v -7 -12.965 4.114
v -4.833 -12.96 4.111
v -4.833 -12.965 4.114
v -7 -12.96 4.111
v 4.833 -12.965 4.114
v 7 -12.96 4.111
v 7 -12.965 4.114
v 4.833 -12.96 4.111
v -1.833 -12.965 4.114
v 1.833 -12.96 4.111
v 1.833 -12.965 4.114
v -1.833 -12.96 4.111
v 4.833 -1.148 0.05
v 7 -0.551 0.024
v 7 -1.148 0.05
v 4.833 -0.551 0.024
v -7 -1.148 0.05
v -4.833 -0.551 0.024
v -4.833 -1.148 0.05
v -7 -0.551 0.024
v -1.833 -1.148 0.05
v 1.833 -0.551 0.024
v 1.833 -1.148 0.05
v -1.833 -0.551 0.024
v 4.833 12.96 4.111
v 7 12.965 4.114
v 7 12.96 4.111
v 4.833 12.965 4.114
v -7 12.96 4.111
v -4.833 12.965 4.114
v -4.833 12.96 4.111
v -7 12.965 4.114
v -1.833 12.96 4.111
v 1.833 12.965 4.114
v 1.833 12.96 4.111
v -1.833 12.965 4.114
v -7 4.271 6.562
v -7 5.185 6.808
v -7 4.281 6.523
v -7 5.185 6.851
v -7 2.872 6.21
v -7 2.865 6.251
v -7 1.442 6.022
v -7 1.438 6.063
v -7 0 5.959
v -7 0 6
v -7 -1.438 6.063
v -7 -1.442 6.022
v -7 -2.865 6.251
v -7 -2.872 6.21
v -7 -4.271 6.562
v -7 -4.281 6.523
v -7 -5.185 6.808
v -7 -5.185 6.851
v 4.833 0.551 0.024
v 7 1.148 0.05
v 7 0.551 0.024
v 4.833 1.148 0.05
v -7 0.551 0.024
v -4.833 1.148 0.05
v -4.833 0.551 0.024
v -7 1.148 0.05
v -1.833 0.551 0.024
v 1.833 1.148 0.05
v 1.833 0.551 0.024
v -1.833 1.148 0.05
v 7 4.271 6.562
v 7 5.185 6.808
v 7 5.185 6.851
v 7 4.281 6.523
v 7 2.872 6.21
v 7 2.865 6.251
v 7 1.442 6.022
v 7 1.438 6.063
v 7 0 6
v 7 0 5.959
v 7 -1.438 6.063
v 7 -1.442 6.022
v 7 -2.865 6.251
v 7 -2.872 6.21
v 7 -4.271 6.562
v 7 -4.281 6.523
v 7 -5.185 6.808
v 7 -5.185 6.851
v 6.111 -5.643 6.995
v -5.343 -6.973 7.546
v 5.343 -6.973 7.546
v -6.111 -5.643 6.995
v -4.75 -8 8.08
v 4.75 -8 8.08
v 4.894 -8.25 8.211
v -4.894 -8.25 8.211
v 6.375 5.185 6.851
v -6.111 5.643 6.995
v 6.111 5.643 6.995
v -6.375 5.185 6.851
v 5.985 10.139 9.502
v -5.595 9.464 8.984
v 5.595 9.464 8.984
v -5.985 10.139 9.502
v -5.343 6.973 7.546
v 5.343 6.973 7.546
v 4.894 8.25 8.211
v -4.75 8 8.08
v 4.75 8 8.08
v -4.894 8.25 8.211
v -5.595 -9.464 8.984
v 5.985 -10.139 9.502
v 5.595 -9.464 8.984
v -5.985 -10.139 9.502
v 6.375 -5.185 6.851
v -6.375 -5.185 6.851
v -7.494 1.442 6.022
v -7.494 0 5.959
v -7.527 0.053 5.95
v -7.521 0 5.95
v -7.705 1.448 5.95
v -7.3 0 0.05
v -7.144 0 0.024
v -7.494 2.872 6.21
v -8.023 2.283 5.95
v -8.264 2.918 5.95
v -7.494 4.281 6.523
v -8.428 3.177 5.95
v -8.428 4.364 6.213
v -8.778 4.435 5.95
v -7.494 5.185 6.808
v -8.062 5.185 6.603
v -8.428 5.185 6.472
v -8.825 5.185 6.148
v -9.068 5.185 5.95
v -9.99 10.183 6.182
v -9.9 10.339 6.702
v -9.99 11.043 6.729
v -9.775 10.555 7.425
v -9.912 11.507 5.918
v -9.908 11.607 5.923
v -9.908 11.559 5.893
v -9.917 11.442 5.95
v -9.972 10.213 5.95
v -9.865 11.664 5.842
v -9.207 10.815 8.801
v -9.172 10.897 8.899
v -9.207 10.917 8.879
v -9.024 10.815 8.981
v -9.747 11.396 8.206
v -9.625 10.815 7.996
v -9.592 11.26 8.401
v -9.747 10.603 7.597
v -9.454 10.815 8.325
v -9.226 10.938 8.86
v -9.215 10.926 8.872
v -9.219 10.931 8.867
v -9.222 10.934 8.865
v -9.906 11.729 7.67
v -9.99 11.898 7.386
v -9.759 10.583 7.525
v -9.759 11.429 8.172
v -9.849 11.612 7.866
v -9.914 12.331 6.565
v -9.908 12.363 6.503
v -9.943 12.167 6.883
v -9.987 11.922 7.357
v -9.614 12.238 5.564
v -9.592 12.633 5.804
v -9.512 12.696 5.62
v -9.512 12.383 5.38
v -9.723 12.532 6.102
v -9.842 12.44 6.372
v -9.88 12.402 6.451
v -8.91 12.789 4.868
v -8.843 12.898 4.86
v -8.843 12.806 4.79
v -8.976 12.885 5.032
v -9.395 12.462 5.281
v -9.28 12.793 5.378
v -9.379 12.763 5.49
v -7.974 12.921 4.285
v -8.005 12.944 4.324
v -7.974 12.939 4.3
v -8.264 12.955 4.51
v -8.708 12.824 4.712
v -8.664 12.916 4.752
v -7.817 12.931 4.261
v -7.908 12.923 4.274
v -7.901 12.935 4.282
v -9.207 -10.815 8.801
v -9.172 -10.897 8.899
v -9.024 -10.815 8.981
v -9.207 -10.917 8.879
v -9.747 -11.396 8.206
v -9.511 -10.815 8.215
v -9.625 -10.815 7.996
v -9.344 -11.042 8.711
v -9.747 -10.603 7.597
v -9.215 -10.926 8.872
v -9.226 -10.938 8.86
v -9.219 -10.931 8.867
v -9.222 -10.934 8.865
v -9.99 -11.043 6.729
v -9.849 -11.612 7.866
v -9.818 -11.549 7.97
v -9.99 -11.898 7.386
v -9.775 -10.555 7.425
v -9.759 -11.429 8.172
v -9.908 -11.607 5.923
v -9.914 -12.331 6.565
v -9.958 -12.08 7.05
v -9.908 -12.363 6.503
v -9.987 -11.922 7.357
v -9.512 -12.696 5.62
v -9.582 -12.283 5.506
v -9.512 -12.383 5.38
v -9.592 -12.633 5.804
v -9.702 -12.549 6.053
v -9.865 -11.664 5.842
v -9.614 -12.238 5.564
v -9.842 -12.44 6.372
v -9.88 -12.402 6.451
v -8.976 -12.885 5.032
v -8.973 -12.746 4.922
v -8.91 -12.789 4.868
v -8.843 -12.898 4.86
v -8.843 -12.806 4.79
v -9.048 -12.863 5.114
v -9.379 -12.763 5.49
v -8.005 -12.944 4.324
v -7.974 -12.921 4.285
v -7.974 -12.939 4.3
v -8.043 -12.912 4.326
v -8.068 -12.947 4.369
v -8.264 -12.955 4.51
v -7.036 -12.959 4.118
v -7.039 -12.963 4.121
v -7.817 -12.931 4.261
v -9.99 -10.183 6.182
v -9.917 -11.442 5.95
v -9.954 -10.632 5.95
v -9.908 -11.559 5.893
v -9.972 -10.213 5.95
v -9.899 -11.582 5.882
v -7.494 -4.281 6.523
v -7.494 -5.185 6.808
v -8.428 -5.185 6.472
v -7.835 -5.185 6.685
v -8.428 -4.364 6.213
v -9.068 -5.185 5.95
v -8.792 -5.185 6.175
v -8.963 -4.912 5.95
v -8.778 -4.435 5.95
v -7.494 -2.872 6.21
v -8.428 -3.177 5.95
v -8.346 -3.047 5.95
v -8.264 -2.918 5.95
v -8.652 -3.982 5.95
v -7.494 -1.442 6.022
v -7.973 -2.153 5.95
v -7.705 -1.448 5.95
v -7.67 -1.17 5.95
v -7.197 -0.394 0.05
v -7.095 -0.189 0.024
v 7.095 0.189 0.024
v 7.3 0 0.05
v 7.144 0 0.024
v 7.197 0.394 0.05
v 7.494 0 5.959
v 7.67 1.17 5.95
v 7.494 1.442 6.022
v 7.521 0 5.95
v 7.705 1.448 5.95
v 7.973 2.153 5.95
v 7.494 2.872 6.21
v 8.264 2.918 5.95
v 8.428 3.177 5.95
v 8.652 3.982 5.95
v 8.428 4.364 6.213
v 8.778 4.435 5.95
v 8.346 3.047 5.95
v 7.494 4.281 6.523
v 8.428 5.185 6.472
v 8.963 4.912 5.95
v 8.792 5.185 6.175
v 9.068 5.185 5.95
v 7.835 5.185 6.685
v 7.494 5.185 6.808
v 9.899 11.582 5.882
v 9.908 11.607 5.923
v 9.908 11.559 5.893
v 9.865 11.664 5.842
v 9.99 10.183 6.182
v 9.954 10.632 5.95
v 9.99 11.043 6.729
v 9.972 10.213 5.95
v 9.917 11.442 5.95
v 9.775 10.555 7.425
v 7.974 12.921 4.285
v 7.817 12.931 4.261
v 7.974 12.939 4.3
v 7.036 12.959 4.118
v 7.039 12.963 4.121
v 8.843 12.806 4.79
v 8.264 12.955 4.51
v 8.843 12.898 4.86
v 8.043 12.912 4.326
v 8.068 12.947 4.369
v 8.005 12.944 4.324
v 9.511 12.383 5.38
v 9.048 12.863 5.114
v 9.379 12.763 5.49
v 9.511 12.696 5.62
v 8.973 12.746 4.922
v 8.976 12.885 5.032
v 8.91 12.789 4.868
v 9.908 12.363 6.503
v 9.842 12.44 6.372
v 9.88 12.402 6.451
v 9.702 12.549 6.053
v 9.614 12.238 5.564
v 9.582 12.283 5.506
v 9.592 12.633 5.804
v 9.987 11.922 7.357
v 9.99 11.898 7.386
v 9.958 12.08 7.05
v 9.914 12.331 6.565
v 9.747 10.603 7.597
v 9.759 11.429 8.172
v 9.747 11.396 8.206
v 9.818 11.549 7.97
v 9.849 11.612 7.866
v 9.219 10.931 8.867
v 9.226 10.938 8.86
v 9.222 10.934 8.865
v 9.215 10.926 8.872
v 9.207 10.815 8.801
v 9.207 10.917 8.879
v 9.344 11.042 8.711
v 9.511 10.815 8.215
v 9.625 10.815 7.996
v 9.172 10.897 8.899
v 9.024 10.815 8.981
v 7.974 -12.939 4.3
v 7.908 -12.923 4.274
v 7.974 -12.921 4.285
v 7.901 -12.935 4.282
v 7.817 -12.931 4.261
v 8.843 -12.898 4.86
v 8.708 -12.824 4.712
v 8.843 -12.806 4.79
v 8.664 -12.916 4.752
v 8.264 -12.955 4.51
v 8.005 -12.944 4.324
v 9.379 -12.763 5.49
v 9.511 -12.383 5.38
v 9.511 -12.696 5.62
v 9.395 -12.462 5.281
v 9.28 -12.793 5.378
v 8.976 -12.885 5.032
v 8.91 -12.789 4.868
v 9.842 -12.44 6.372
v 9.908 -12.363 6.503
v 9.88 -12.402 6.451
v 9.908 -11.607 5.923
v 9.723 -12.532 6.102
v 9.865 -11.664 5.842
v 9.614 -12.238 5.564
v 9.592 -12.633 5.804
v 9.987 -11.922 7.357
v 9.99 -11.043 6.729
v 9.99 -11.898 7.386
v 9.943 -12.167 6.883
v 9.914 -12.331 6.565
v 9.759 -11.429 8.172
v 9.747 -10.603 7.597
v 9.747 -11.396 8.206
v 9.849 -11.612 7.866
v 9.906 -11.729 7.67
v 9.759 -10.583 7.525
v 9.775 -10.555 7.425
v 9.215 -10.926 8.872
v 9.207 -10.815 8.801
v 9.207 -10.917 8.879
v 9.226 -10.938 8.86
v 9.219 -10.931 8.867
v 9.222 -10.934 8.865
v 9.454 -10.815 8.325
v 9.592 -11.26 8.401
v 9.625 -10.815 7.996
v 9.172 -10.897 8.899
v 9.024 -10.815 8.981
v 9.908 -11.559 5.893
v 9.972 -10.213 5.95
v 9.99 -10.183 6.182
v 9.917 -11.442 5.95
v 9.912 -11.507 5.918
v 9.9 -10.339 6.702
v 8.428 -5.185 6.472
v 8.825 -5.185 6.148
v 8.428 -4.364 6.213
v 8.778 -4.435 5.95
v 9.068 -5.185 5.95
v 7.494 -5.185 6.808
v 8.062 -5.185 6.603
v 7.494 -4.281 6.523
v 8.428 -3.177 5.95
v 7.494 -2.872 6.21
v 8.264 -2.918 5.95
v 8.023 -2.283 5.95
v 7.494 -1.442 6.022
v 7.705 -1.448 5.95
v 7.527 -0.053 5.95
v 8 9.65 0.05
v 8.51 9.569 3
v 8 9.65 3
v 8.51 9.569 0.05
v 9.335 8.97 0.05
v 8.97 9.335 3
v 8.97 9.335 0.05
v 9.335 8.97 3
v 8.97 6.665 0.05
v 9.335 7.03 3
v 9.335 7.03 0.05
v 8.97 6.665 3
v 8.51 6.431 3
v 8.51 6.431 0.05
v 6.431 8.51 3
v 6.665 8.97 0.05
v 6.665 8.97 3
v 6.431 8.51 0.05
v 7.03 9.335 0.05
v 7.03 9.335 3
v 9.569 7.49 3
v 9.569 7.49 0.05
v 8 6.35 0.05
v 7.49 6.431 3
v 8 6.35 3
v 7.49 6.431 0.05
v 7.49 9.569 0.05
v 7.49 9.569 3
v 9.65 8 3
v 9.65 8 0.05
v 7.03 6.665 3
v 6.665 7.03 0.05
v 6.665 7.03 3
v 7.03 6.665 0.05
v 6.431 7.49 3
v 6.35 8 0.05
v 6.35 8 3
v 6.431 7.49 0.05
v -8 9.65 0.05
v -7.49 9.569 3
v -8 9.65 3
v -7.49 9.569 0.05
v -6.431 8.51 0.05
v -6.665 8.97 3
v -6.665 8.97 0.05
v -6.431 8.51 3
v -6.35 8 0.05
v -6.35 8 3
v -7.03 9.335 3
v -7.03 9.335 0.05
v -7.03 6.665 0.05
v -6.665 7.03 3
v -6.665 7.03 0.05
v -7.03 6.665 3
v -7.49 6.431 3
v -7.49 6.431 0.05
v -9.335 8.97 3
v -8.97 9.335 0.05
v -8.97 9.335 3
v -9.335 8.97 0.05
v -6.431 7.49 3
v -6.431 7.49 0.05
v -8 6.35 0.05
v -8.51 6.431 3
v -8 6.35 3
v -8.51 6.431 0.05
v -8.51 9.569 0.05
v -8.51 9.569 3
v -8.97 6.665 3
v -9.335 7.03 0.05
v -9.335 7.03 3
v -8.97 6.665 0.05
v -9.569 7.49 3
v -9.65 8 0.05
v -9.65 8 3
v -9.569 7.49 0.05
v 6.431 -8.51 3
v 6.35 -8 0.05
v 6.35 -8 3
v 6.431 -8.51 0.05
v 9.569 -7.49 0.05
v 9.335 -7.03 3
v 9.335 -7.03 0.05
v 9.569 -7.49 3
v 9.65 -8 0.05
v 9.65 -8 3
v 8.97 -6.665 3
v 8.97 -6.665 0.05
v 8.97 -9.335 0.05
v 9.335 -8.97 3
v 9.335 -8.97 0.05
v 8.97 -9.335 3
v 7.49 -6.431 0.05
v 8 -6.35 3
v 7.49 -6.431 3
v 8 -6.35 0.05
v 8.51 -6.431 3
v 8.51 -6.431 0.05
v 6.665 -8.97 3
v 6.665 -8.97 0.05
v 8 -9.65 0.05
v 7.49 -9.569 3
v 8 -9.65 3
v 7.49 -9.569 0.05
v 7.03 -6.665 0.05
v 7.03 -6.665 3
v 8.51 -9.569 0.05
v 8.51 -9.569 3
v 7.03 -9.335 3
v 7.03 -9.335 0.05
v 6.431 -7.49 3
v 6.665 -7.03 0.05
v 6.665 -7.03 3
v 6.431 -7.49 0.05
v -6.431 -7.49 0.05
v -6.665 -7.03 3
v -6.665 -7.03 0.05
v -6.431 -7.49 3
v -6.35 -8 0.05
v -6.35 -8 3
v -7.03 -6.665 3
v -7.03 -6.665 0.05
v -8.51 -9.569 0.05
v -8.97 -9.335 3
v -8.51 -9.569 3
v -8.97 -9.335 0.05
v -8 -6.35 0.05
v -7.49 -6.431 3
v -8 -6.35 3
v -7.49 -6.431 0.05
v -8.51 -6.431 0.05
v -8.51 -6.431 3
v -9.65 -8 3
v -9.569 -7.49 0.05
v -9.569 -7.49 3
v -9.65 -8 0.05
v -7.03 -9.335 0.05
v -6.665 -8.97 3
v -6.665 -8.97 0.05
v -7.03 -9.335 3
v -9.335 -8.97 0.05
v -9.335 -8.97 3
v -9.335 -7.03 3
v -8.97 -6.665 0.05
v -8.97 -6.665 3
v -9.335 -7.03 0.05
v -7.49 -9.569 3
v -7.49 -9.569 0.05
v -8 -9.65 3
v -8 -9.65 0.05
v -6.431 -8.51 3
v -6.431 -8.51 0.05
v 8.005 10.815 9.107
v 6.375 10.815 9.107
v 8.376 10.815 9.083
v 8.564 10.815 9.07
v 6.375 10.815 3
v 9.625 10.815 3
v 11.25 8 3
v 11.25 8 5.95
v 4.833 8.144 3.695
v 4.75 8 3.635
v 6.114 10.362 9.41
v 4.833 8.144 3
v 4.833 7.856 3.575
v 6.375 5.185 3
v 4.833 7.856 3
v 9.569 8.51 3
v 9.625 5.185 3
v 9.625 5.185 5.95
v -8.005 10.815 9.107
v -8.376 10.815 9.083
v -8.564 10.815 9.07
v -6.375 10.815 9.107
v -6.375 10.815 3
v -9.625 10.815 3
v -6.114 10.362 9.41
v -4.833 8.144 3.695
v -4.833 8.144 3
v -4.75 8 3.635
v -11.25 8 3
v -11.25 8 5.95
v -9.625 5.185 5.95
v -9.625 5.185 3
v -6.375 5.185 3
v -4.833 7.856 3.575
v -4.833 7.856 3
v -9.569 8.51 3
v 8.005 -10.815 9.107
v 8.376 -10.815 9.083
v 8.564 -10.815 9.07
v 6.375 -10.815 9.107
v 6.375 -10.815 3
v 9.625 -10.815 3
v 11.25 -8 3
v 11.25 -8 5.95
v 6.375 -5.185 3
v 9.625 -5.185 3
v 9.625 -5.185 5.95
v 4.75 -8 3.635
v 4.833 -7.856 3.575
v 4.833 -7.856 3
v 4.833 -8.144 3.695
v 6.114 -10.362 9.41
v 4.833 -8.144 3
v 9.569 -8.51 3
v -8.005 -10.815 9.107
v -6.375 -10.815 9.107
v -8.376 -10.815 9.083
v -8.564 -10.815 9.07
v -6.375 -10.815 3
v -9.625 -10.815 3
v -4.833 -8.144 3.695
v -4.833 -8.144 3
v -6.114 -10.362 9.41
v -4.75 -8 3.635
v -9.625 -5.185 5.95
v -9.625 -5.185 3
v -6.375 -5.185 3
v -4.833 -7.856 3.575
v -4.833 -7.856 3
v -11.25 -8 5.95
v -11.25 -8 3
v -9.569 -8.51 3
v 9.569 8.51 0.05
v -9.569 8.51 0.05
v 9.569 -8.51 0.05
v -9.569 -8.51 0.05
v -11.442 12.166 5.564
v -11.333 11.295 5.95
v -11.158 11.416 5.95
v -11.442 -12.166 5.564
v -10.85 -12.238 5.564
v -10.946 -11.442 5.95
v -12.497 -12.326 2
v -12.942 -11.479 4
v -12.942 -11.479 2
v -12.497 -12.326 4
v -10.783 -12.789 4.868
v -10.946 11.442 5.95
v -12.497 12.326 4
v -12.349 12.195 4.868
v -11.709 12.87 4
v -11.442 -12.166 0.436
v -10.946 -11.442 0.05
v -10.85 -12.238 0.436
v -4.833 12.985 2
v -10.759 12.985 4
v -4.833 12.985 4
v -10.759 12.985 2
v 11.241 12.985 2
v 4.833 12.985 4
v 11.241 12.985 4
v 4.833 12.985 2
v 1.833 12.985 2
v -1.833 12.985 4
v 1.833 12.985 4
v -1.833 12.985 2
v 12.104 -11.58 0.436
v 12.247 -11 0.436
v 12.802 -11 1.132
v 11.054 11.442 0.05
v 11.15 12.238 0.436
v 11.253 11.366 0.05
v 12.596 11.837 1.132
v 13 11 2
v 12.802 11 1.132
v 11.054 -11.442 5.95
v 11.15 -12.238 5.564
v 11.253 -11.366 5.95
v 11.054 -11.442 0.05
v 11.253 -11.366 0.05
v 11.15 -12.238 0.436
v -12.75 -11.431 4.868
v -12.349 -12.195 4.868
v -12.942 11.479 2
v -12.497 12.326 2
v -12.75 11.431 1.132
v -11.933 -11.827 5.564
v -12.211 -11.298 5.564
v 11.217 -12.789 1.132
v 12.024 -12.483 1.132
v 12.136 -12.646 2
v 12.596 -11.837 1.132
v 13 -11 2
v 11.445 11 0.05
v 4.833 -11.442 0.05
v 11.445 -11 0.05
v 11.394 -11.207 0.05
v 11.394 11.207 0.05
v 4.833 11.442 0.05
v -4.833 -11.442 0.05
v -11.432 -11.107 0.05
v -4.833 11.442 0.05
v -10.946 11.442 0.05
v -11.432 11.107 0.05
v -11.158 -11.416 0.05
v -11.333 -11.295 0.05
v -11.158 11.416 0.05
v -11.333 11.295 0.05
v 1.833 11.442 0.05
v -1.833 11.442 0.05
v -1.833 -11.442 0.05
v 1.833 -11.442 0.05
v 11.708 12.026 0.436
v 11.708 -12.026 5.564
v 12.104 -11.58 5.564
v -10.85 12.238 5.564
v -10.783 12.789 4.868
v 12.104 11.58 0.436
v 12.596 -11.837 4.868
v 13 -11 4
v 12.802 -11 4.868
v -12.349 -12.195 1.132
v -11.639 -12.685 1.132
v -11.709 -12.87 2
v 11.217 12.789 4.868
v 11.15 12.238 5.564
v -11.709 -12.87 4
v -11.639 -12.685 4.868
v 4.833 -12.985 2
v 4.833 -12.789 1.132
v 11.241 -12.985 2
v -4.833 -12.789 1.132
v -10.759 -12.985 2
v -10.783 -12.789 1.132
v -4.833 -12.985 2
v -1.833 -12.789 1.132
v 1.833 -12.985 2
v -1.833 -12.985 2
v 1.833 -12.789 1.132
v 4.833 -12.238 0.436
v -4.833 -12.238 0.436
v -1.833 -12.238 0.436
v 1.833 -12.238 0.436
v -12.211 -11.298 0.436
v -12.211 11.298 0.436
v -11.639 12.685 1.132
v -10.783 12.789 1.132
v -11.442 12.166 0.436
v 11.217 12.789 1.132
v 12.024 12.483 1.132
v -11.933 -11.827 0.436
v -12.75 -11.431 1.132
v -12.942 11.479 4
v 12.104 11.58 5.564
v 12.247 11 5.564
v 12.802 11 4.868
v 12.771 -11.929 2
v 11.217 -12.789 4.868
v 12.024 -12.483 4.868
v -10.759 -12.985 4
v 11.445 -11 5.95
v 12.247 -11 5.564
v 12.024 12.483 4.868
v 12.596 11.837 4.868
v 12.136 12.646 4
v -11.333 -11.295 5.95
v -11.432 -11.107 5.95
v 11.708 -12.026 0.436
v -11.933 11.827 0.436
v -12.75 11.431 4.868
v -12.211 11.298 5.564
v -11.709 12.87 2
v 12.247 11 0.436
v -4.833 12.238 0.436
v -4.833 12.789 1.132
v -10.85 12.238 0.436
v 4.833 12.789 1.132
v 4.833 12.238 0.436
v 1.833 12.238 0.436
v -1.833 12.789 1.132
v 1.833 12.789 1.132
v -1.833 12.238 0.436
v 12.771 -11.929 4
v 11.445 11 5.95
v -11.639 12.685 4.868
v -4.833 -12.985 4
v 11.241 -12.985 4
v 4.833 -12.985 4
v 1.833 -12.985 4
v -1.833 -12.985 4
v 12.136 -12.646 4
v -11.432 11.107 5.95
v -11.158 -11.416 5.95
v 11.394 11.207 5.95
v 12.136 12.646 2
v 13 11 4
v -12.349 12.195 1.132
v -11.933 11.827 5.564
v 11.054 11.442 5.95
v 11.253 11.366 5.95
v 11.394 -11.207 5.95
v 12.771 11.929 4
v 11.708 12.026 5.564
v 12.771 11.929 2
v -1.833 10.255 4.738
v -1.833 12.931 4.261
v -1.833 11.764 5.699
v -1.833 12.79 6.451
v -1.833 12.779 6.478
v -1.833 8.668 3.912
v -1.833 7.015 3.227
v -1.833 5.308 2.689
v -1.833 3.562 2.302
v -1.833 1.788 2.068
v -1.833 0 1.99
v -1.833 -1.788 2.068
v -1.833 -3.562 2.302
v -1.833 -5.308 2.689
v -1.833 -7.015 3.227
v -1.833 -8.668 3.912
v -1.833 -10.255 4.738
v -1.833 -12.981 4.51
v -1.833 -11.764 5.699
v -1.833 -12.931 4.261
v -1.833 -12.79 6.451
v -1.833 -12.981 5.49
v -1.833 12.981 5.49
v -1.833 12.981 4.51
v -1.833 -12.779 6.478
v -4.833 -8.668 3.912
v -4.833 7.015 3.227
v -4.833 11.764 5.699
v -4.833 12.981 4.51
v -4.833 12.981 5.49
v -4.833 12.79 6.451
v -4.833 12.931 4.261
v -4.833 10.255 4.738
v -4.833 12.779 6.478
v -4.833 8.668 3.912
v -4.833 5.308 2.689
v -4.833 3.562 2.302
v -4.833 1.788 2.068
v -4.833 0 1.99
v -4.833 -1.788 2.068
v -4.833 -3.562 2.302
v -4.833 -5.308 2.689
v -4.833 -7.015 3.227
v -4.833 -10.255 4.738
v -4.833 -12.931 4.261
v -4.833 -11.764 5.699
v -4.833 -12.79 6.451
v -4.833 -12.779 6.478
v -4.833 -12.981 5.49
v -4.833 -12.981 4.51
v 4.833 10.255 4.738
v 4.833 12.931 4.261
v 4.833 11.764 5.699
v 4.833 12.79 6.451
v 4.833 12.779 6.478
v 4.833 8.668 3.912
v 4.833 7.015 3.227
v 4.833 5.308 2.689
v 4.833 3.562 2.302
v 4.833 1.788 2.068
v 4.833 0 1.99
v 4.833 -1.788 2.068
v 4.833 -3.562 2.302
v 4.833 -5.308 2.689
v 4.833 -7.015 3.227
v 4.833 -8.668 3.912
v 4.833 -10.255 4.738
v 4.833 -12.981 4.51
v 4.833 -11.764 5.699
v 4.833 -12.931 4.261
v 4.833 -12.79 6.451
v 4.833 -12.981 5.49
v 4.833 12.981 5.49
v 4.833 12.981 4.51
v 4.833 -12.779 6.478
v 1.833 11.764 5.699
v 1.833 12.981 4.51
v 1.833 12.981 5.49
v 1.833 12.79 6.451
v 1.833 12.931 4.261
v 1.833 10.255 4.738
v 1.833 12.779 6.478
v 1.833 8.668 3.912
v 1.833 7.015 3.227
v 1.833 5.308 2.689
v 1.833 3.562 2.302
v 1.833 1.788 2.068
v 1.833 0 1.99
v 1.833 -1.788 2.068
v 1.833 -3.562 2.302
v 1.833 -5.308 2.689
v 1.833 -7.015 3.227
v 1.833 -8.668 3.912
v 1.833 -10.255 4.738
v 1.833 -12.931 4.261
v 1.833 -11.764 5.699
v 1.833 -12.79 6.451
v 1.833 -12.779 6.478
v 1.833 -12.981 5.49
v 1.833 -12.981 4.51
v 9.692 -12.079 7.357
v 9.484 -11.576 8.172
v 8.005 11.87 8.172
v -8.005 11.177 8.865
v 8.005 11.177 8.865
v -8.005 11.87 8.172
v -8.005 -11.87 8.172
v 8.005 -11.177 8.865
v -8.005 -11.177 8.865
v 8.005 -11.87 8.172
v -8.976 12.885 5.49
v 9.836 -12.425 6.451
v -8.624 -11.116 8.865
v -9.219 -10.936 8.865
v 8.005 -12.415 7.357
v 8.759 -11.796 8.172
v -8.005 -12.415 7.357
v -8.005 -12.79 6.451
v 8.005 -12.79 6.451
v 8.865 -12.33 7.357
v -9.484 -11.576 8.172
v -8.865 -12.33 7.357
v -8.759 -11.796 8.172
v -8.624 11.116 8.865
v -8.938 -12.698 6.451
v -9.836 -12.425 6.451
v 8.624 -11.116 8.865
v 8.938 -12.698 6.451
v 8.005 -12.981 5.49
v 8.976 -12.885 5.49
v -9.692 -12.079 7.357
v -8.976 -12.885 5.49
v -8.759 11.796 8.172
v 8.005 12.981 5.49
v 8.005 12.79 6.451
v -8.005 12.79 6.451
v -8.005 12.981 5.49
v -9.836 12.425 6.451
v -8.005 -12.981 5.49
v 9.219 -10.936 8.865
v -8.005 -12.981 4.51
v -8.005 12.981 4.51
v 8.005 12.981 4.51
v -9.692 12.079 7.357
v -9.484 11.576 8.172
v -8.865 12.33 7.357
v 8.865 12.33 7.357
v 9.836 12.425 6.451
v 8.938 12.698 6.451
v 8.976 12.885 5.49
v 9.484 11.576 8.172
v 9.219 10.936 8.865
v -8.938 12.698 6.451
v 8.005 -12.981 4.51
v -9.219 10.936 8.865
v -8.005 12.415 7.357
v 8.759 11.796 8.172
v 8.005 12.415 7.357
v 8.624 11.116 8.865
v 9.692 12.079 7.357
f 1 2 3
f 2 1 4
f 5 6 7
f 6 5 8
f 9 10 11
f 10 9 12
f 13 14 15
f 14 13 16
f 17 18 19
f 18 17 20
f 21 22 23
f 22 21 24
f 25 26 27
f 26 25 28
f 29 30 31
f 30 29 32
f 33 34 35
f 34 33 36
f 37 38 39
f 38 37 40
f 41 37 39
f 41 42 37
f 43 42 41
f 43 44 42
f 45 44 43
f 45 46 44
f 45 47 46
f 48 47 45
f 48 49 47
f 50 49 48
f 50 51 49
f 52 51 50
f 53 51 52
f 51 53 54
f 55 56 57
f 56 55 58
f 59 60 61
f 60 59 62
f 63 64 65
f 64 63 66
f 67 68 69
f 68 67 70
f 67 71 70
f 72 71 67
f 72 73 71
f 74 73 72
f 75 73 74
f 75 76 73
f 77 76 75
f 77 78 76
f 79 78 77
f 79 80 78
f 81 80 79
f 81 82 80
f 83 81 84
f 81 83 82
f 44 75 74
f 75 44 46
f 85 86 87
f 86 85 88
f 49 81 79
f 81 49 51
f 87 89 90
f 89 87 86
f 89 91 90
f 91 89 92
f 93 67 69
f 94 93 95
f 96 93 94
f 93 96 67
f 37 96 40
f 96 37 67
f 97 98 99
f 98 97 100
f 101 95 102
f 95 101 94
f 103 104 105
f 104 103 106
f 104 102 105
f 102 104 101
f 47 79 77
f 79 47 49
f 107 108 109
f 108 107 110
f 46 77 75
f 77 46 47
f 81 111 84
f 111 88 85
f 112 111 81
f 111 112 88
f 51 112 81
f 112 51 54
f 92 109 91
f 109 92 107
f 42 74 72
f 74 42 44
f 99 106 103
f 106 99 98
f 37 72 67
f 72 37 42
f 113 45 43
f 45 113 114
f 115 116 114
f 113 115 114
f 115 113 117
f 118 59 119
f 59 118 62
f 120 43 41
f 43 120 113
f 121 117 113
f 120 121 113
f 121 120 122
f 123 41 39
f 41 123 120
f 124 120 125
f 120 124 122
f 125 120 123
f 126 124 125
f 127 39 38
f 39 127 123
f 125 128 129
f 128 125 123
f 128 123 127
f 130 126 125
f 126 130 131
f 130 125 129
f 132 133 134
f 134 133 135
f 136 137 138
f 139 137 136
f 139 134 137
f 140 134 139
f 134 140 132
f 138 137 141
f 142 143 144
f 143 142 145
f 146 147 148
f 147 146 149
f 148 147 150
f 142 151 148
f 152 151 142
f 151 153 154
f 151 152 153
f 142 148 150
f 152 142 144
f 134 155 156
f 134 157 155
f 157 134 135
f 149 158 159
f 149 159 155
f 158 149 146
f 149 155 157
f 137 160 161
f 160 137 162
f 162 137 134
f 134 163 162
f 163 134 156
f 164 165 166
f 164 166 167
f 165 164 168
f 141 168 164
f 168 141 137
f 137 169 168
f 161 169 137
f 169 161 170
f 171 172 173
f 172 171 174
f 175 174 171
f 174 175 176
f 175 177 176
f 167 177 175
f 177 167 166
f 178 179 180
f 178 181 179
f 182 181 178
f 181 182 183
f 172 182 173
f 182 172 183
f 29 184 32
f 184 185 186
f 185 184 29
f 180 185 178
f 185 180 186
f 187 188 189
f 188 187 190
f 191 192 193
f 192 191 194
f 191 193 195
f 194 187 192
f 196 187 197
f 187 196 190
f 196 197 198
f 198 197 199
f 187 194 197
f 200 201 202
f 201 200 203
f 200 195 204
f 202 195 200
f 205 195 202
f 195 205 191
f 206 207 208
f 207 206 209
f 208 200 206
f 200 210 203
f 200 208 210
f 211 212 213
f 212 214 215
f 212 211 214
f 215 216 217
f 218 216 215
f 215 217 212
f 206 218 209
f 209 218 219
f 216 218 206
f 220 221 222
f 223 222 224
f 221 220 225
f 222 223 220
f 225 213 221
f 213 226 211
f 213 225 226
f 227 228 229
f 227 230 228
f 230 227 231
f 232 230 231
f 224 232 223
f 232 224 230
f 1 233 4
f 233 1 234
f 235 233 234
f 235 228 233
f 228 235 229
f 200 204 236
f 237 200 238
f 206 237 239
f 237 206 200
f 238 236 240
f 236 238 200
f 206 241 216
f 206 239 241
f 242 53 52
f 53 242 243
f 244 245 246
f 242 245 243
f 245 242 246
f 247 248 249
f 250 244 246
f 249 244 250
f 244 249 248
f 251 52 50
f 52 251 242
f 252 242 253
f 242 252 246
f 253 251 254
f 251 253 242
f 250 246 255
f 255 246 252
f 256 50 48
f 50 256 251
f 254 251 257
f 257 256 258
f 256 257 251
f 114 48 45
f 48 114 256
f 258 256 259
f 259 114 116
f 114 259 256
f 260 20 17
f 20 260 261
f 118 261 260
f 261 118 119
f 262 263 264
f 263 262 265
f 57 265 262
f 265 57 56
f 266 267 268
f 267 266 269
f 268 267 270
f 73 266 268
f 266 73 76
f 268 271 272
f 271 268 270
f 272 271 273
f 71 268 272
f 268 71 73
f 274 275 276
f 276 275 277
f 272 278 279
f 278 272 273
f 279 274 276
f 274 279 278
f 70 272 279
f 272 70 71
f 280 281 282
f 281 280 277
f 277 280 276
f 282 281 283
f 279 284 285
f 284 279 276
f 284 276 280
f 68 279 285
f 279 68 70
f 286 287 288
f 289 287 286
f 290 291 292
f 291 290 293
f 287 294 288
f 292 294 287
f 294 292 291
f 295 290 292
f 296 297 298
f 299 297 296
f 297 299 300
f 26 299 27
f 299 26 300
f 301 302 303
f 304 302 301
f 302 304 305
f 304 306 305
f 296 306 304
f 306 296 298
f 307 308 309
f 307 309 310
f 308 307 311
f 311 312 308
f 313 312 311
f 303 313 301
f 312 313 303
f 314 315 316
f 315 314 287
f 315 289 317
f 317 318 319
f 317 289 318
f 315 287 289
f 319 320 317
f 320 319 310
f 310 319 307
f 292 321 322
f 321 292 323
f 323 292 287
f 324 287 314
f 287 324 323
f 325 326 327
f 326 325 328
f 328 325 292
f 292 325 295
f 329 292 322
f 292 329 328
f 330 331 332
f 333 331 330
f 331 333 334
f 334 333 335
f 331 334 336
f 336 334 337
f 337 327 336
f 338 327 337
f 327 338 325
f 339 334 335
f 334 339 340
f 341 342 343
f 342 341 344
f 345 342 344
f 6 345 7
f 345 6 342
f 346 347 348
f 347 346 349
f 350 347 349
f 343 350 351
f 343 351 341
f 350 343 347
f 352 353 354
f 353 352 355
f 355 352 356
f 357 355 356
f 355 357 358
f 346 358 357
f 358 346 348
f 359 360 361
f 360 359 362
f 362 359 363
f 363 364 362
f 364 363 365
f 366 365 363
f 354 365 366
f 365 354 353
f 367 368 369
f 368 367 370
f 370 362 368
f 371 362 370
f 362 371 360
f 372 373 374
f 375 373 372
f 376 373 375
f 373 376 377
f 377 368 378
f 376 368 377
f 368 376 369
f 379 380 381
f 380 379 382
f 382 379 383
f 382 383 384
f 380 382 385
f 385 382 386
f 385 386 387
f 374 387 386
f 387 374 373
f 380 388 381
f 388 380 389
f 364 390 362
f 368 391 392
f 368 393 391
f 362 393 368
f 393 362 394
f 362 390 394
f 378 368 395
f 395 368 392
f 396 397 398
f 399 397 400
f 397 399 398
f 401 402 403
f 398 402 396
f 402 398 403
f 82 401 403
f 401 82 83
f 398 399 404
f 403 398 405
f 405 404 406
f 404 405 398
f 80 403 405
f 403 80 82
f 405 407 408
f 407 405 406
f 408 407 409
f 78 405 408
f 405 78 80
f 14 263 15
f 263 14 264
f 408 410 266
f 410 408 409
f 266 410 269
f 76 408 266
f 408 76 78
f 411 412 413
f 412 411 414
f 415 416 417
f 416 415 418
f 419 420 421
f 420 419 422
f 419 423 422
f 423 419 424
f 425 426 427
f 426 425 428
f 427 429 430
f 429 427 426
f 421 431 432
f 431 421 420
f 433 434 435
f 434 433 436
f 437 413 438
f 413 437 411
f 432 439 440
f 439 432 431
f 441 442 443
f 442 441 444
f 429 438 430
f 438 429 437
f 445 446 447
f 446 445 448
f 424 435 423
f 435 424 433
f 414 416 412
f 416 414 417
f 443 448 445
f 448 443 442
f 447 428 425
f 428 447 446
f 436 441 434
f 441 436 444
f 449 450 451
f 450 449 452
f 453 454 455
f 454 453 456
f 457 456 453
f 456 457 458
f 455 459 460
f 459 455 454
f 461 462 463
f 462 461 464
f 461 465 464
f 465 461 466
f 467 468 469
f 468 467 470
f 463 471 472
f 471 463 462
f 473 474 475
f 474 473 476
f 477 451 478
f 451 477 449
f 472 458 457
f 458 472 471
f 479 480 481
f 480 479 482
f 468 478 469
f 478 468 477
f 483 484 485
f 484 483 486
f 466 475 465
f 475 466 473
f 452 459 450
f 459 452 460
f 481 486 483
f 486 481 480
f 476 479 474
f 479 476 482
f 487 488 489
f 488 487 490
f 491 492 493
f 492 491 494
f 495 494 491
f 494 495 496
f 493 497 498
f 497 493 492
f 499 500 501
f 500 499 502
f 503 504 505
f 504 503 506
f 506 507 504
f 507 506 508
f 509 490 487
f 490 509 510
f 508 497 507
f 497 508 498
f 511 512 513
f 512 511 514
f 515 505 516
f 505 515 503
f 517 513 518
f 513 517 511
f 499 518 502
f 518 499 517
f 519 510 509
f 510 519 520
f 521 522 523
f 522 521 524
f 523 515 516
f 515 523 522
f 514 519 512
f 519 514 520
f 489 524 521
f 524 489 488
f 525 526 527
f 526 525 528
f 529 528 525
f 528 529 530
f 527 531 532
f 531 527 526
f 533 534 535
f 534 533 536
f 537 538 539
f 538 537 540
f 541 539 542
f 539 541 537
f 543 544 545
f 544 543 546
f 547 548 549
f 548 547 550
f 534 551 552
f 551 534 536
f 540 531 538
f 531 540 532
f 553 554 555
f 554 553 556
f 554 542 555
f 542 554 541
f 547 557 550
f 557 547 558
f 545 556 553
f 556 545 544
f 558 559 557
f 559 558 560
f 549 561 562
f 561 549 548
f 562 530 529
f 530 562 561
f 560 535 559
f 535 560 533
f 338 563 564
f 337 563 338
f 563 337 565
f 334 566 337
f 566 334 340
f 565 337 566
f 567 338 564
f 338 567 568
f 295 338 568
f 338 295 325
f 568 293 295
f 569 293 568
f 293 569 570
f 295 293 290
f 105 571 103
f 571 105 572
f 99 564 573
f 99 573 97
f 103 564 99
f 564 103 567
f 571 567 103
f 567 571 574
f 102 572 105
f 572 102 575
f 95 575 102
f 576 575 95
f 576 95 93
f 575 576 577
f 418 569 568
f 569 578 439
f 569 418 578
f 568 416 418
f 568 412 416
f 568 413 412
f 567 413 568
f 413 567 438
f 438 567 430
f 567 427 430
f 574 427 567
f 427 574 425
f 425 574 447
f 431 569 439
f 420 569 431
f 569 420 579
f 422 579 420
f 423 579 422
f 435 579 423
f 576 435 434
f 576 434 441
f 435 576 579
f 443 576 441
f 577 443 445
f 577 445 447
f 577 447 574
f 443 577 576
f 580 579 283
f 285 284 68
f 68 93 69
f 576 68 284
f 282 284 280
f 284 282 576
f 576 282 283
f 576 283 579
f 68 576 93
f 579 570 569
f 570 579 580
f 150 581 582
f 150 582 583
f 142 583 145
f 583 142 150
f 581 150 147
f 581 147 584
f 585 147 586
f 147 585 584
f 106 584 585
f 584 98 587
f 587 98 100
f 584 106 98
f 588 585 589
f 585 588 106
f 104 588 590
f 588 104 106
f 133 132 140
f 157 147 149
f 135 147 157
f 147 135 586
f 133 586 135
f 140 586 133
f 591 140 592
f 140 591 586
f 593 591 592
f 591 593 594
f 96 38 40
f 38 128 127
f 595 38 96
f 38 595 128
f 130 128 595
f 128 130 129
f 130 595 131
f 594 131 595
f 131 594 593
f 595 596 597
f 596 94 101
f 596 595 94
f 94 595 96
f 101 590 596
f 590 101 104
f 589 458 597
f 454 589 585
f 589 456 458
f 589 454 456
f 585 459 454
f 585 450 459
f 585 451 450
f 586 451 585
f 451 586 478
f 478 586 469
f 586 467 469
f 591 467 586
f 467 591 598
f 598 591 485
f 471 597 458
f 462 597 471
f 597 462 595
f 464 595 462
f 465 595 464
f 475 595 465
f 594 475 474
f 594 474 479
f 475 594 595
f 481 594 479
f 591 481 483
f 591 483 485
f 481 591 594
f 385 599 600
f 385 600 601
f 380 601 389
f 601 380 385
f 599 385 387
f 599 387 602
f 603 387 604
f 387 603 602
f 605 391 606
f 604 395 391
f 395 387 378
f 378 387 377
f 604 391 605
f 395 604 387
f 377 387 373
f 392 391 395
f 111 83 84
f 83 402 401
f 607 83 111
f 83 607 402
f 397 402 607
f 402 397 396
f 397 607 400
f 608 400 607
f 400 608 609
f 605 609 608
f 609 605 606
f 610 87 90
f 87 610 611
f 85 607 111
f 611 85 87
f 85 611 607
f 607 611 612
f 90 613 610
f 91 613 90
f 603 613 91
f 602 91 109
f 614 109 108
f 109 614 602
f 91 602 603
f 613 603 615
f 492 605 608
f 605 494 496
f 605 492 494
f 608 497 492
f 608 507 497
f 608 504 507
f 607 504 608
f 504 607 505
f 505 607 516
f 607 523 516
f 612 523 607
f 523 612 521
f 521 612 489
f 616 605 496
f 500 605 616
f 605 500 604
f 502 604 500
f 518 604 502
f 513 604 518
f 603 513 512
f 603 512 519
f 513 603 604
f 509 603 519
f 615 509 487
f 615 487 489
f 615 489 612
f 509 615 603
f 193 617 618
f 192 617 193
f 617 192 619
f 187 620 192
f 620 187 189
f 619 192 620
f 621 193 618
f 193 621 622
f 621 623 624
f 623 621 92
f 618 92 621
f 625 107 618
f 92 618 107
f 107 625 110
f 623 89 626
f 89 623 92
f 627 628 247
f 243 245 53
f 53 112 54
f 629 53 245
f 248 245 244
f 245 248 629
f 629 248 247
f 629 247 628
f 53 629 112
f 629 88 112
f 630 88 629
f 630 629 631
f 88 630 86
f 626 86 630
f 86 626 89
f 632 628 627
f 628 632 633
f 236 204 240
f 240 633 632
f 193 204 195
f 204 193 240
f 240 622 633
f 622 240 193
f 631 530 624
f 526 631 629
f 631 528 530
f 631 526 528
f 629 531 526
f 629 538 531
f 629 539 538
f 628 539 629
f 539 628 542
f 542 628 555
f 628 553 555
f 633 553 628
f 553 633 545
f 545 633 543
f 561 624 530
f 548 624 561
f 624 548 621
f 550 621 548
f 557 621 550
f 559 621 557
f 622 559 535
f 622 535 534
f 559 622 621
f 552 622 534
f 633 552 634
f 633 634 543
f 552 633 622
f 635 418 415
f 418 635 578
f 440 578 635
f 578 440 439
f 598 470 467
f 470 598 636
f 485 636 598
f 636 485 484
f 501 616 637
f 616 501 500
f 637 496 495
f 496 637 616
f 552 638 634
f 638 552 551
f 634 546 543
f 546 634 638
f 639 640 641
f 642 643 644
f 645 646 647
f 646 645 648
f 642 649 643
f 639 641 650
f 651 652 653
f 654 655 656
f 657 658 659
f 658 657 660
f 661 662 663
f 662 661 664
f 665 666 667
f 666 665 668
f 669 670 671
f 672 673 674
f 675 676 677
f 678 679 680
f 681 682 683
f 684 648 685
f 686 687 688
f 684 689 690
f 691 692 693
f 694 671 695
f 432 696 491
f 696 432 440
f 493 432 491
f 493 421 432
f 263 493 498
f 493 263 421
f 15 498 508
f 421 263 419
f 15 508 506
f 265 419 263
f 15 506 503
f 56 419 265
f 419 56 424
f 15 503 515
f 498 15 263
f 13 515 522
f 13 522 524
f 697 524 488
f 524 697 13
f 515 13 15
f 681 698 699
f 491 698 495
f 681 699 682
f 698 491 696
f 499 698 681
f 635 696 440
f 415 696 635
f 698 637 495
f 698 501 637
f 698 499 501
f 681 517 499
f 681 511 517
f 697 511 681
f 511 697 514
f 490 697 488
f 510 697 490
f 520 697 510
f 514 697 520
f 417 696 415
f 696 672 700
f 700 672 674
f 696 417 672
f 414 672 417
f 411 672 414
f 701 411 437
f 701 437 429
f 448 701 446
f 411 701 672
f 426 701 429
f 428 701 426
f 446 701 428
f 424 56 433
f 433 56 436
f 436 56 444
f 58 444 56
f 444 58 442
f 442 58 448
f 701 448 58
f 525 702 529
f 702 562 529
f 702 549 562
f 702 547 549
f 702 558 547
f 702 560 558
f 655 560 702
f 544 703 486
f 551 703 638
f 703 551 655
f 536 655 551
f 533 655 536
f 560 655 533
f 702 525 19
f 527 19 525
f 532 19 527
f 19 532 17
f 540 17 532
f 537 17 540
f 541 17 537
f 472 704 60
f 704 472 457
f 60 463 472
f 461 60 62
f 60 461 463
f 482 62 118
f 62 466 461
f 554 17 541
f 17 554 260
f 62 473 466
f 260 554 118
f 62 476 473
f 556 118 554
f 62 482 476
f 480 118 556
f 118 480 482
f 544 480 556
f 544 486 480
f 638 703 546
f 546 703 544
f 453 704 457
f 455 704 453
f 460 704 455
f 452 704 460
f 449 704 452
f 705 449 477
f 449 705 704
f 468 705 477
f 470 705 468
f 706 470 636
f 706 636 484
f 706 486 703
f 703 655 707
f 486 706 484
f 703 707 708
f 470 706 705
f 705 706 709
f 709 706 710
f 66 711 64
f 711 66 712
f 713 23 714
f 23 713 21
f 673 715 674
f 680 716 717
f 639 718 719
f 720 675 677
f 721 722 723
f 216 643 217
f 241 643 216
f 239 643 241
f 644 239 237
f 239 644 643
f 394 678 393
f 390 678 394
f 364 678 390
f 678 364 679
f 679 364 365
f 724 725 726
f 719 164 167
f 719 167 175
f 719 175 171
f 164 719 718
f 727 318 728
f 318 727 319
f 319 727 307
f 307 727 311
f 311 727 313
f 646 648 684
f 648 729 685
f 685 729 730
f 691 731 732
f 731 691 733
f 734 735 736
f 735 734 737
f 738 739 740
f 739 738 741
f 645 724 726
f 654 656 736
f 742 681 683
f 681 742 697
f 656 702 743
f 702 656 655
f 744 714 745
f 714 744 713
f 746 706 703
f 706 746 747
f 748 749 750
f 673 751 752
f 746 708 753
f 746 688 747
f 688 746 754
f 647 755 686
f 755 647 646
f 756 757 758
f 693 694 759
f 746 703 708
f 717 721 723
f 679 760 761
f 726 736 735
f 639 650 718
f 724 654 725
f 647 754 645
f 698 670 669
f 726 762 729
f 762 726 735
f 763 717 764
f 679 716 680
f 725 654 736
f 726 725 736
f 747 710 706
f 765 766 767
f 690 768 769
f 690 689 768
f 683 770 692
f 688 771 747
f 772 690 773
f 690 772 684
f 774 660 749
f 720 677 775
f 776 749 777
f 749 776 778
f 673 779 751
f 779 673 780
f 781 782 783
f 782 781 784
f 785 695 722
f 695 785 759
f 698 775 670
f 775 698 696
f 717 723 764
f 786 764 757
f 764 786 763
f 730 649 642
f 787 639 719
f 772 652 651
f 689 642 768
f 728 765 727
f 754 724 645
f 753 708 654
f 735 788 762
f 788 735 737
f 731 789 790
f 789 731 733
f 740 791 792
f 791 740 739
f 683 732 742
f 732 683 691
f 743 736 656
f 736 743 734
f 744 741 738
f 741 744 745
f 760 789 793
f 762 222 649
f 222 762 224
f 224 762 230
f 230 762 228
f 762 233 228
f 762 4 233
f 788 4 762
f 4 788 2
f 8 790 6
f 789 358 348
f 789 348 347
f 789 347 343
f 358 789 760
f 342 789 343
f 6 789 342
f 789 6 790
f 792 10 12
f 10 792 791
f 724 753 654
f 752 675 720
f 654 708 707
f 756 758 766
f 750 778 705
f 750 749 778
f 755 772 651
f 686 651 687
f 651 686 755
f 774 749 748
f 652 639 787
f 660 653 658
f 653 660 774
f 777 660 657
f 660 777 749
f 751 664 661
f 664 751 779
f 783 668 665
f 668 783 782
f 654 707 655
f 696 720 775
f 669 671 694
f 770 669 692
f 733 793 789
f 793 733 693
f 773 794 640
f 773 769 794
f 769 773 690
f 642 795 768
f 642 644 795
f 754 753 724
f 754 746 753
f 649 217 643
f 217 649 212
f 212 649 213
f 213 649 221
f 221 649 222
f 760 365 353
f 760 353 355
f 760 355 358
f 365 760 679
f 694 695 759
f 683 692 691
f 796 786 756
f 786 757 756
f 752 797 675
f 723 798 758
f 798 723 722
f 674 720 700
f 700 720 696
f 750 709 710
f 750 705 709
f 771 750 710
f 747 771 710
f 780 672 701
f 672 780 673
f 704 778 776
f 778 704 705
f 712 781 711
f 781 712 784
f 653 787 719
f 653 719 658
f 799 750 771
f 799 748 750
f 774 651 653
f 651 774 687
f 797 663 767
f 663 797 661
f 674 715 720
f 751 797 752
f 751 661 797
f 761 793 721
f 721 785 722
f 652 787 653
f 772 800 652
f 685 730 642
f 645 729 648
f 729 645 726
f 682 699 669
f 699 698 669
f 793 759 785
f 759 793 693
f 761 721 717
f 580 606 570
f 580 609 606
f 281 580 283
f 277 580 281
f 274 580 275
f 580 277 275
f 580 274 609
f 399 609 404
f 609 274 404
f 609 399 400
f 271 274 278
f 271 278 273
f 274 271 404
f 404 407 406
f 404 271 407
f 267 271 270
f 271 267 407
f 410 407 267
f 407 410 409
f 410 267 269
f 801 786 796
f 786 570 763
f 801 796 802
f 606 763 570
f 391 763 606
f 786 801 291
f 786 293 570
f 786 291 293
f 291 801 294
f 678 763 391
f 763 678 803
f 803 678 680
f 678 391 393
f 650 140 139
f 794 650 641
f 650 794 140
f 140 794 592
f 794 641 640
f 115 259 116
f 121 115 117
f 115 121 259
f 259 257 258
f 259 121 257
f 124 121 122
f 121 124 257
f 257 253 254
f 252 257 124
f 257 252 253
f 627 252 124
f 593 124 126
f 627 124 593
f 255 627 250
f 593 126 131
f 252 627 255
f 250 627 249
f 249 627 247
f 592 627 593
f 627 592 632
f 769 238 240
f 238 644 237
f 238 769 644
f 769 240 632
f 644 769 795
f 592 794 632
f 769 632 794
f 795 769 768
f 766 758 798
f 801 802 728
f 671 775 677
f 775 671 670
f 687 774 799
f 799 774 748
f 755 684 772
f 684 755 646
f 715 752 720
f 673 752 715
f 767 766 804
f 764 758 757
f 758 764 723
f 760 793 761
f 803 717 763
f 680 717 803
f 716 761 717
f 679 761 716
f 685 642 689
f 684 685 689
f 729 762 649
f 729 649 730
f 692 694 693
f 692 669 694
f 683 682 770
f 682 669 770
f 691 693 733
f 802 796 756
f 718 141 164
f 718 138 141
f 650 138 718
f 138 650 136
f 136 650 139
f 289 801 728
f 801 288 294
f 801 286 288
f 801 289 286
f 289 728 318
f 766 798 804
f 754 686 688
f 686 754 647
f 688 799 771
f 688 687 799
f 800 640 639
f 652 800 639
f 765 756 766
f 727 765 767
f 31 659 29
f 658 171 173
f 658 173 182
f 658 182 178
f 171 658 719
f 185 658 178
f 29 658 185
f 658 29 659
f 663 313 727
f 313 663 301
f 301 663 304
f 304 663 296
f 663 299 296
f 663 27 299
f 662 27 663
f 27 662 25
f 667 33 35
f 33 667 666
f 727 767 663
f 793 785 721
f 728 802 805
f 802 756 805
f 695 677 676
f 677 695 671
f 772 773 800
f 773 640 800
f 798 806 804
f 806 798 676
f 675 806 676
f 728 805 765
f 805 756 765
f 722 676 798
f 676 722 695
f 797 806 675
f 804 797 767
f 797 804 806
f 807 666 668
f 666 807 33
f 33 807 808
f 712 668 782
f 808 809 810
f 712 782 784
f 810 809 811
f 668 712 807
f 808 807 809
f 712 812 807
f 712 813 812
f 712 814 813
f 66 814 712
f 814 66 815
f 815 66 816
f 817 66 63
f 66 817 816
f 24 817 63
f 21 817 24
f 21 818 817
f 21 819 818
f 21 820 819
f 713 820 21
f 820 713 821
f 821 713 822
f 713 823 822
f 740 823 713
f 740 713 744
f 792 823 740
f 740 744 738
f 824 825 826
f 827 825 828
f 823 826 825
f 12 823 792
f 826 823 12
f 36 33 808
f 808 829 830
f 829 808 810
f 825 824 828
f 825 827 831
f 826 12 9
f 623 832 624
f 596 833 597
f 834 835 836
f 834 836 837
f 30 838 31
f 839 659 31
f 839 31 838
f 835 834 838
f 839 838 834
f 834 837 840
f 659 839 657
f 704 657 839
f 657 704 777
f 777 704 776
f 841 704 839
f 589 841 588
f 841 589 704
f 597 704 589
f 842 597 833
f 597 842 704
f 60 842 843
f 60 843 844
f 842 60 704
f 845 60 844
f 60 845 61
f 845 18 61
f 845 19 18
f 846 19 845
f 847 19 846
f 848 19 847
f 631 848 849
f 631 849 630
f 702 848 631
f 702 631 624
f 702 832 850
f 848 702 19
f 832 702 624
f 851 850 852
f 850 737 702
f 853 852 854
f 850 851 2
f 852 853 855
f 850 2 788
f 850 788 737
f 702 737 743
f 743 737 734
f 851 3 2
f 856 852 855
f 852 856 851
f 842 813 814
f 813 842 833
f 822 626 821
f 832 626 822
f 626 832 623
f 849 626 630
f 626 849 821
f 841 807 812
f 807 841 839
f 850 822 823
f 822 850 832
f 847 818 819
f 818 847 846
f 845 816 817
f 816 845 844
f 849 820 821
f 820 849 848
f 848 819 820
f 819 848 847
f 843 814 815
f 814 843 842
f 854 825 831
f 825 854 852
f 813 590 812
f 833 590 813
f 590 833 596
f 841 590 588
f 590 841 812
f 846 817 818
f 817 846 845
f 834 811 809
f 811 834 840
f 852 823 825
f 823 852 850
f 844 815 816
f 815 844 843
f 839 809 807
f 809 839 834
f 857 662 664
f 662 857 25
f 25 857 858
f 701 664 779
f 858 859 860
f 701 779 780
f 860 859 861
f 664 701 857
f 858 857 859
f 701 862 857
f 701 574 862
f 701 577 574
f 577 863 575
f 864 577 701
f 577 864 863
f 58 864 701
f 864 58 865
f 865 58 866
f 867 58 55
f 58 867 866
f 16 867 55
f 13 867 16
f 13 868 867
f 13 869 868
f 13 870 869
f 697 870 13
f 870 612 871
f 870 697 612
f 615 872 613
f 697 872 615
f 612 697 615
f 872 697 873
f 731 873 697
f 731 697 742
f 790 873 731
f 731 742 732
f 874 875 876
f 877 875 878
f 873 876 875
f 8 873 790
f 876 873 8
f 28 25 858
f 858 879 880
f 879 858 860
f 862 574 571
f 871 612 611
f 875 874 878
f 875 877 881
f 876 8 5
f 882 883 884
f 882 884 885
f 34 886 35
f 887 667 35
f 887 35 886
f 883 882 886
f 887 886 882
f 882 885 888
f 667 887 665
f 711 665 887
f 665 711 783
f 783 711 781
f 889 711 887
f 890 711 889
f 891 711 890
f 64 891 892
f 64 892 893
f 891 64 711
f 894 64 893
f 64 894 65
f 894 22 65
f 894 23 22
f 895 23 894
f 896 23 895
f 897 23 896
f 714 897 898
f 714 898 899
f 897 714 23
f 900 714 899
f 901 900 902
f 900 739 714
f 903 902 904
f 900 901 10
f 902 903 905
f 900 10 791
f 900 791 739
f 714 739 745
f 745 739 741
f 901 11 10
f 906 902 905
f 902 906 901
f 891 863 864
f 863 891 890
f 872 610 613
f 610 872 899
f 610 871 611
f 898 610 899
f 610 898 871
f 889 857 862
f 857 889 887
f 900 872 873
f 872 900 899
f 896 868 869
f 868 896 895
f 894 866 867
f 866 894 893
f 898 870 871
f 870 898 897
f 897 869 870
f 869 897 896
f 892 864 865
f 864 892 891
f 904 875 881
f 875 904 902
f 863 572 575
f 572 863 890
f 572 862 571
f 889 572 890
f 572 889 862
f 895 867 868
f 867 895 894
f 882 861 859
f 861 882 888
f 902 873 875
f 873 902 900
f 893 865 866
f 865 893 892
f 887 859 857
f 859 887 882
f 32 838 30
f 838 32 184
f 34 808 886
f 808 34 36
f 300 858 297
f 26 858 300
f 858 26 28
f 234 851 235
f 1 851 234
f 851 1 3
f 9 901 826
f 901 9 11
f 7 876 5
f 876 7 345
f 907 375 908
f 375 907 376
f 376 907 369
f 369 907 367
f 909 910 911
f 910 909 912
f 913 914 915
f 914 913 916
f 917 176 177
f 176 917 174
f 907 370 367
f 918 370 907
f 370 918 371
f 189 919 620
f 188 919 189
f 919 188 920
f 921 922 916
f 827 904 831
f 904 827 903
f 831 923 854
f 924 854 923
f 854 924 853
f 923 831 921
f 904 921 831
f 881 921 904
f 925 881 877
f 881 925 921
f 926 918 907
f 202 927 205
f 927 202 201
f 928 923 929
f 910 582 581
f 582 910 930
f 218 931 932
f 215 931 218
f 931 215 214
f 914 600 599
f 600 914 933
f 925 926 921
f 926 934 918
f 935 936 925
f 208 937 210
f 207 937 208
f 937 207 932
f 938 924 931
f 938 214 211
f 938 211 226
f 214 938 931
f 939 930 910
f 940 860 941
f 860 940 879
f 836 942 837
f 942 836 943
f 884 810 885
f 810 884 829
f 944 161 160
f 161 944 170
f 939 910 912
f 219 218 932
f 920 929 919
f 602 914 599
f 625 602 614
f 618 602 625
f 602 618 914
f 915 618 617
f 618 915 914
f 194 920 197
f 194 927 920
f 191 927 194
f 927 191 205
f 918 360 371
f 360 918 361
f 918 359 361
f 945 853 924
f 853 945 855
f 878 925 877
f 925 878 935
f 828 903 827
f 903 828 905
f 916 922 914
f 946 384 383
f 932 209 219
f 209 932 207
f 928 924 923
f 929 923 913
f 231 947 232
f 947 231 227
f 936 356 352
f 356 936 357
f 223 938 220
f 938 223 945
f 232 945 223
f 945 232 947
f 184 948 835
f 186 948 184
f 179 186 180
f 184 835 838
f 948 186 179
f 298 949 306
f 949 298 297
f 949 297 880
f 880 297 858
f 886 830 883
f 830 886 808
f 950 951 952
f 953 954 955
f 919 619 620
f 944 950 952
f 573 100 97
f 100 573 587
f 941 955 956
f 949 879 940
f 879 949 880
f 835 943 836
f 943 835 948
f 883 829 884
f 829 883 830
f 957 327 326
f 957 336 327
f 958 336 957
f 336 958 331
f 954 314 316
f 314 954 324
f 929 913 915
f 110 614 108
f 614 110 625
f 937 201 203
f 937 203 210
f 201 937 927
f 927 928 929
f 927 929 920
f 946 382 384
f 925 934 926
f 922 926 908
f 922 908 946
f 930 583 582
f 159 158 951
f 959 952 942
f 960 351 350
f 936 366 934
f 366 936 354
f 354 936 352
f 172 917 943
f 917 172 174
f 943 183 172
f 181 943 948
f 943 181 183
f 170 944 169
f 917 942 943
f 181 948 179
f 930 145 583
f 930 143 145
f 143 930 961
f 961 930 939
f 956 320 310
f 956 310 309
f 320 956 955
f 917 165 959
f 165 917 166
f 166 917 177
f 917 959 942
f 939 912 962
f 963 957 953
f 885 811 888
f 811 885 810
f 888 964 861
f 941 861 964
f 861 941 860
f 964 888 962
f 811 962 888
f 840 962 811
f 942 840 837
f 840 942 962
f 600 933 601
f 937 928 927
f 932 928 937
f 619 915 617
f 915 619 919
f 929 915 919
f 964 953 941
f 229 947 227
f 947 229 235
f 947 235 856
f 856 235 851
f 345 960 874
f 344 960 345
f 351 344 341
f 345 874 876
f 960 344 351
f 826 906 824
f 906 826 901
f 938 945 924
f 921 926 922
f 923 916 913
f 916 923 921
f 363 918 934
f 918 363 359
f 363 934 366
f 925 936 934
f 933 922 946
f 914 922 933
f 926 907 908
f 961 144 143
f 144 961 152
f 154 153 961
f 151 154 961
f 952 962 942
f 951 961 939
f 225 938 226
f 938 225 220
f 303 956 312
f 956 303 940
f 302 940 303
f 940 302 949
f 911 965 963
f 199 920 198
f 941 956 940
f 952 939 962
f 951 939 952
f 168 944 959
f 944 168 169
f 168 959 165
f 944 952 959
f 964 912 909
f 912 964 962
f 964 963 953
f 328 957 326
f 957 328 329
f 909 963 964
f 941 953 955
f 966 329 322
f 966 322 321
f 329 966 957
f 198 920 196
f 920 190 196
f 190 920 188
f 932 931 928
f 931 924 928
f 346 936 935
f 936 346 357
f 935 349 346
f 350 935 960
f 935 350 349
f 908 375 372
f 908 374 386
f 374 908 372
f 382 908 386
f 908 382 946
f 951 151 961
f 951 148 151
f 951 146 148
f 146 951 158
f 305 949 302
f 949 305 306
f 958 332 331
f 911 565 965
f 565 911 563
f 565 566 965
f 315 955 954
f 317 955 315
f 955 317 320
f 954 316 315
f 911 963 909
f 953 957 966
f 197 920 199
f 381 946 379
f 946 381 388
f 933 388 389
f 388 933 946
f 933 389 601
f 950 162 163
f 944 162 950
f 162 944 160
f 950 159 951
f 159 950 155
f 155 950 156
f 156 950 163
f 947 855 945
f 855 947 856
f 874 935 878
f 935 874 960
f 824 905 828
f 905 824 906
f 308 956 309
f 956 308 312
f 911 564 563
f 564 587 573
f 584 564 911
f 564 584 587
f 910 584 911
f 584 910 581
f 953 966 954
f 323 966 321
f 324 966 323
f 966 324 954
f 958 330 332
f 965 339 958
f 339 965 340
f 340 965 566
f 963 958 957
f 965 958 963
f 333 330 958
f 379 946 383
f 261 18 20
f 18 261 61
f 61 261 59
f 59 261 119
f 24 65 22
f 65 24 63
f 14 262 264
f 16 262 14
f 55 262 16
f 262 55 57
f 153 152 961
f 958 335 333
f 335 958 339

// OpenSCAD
// -*- mode: SCAD ; c-file-style: "ellemtel" ; coding: utf-8 -*-
// ****************************************************************************
// Customizable zip tie bike mount for smartphone holders
//
// Copyright 2018-2019 Roland Sieker <ospalh@gmail.com>
// Licence: CC-BY-SA 4.0
//
// Original author: Peter Holzwarth
// Original thing: https://www.thingiverse.com/thing:3066652
// Original licence: CC-BY

// Diameter of the handlebar
tubeDiameter= 33; // [15:0.5:50]

// Width of the mounting ring
width= 20;  // [15:0.5:50]

// Width of the cable ties
cableTiesWidth= 3;  // [1:0.25:10]

// Set to "Render" and click "Create Thing" when done with the setup
preview = 1;  // [1: Preview, 0: Render]


/* [Hidden] */

// plate thickness 1
th= 2;
// plate thickness 2
bt= 4;



r_t = tubeDiameter/2;
some_distance = 50;
ms=0.01;

zip_tie_mount();

module zip_tie_mount()
{
   mirror([0,0,1])
   {
      intersection()
      {
         translate([-10,0,-r_t-bt-th])
         {
            BikeMountUpper();
         }
         union()
         {
            translate([0,0,-(th+bt)/2+ms])
            {
               cubeR([26+ms,26+ms,th+bt+2*ms],2, true);
            }
            translate([0,0,-5])
               cubeR([26+ms,26+ms,10],5, true);
         }

         {


         }
      }
   }
}





// fn for differently sized objects and fs, fa; all for preview or rendering.
pna = 40;
pnb = 15;
pa = 5;
ps = 1;
rna = 180;
rnb = 30;
ra = 2;
rs = 0.25;
function na() = (preview) ? pna : rna;
function nb() = (preview) ? pnb : rnb;
$fs = (preview) ? ps : rs;
$fa = (preview) ? pa : ra;



module BikeMountUpper()
{
   difference()
   {
      union()
      {
         difference()
         {
            MountBase();
            // space for screw bolts
            translate([width/2,0,tubeDiameter/2+6]) mirror([0,0,1]) Plate_rem();
         }
         translate([width/2,0,tubeDiameter/2+6]) mirror([0,0,1]) Plate();
      }
      translate([width/3-cableTiesWidth/2,0,0])
      {
         ring();
      }
      translate([width*2/3-cableTiesWidth/2,0,0])
      {
         ring();
      }
   }
}

// a half ring and side wings for the screws
module MountBase()
{
   difference()
   {
      rotate([0,90,0]) emptyWheel(tubeDiameter/2+3+3,width,3);
      translate([0,-tubeDiameter/2-3-3-0.01,-tubeDiameter/2-3-3-0.01])
      {
         cube([width,tubeDiameter+4*3+0.02,tubeDiameter/2+3+3+0.01]);
      }
   }
   difference()
   {
      hull()
      {
         translate([width/2,-tubeDiameter/2-6,0]) buttonRound(width/2,6,2);
         translate([width/2,tubeDiameter/2+6,0]) buttonRound(width/2,6,2);
      }
      translate([-0.01,0,0]) rotate([0,90,0])
      {
         cylinder(r=tubeDiameter/2+3,h=width+0.02);
      }
   }
}

module Plate()
{
   difference()
   {
      Plate_add();
      Plate_rem();
   }
}

// the plate
module Plate_add()
{
   translate([0,0,(th+bt)/2]) cubeR([26,26,th+bt],2, true);
}

// space for the screws and bolts
module Plate_rem()
{
   translate([0,0,-0.01]) fourScrews(16,16,3.3,th+bt+0.02);
   translate([0,0,(th+bt)/2]) fourScrews(16,16,6.5,th+bt+10,6);
}

// ////////////////////////////////////////////////////////////////
// cube with rounded corners
module cubeR(dims, rnd=1, centerR= false)
{
   translate(centerR?[-dims[0]/2,-dims[1]/2,-dims[2]/2]:[])
   {
      hull()
      {
         translate([rnd,rnd,rnd]) sphere(r=rnd);
         translate([dims[0]-rnd,rnd,rnd]) sphere(r=rnd);
         translate([rnd,dims[1]-rnd,rnd]) sphere(r=rnd);
         translate([dims[0]-rnd,dims[1]-rnd,rnd]) sphere(r=rnd);

         translate([rnd,rnd,dims[2]-rnd]) sphere(r=rnd);
         translate([dims[0]-rnd,rnd,dims[2]-rnd]) sphere(r=rnd);
         translate([rnd,dims[1]-rnd,dims[2]-rnd]) sphere(r=rnd);
         translate([dims[0]-rnd,dims[1]-rnd,dims[2]-rnd]) sphere(r=rnd);
      }
   }
}

// four screw nuts without threads - good for metal screws
// x, y: distances of mid points
// d: screw diameter
// h: nut height
module fourScrews(x, y, d, h, fn=20)
{
   translate([x/2,y/2,0]) cylinder(r=d/2,h=h,$fn=fn);
   translate([-x/2,y/2,0]) cylinder(r=d/2,h=h,$fn=fn);
   translate([x/2,-y/2,0]) cylinder(r=d/2,h=h,$fn=fn);
   translate([-x/2,-y/2,0]) cylinder(r=d/2,h=h,$fn=fn);
}

// ////////////////////////////////////////////////////////////////
// rounded button - lower part is a cylinder, upper part like a filled ring
// r= outer radius
// h= height
// rr= upper rounding
// buttonRound(20,10,2);
module buttonRound(r, h, rr)
{
   hull()
   {
      translate([0,0,h-rr]) bikeWheel(r, rr);
      cylinder(r=r,h=h-rr);
   }
}



// like a bike wheel
// bikeWheel(20,10,2);
module bikeWheel(wr, rr)
{
   translate([0,0,rr]) rotate_extrude(convexity= 2) translate([wr-rr, 0, 0]) circle(r=rr);
}

// like a car wheel
// wheel(20,10,2);
module wheel(wr, h, rr)
{
   hull()
   {
      translate([0,0,rr]) rotate_extrude(convexity= 2) translate([wr-rr, 0, 0]) circle(r=rr);
      translate([0,0,h-rr]) rotate_extrude(convexity= 2) translate([wr-rr, 0, 0]) circle(r=rr);
   }
}

// like an empty car wheel
// emptyWheel(20,10,2);
module emptyWheel(wr, h, rr)
{
   translate([0,0,rr]) rotate_extrude(convexity= 2) translate([wr-rr, 0, 0]) circle(r=rr);
   translate([0,0,rr]) difference()
   {
      cylinder(r=wr,h=h-2*rr);
      translate([0,0,-0.01]) cylinder(r=wr-2*rr,h=h);
   }
   translate([0,0,h-rr]) rotate_extrude(convexity= 2) translate([wr-rr, 0, 0]) circle(r=rr);
}

// simple screw model
// Screw(4, 10, 7, 6);
module Screw(m, h, th, fn= 50)
{
   cylinder(r= m/2, h= h);
   translate([0,0,th]) cylinder(r= m, h= h-th, $fn= fn);
}

// ring space to fix zip ties
// translate([-20,0,0]) ring();
module ring()
{
   rotate([0,90,0])
      difference()
   {
      cylinder(r= tubeDiameter/2+10+3.01,h=cableTiesWidth);
      translate([0,0,-0.01])
         cylinder(r= tubeDiameter/2+1+3.01,h=cableTiesWidth+0.02);
   }
}
